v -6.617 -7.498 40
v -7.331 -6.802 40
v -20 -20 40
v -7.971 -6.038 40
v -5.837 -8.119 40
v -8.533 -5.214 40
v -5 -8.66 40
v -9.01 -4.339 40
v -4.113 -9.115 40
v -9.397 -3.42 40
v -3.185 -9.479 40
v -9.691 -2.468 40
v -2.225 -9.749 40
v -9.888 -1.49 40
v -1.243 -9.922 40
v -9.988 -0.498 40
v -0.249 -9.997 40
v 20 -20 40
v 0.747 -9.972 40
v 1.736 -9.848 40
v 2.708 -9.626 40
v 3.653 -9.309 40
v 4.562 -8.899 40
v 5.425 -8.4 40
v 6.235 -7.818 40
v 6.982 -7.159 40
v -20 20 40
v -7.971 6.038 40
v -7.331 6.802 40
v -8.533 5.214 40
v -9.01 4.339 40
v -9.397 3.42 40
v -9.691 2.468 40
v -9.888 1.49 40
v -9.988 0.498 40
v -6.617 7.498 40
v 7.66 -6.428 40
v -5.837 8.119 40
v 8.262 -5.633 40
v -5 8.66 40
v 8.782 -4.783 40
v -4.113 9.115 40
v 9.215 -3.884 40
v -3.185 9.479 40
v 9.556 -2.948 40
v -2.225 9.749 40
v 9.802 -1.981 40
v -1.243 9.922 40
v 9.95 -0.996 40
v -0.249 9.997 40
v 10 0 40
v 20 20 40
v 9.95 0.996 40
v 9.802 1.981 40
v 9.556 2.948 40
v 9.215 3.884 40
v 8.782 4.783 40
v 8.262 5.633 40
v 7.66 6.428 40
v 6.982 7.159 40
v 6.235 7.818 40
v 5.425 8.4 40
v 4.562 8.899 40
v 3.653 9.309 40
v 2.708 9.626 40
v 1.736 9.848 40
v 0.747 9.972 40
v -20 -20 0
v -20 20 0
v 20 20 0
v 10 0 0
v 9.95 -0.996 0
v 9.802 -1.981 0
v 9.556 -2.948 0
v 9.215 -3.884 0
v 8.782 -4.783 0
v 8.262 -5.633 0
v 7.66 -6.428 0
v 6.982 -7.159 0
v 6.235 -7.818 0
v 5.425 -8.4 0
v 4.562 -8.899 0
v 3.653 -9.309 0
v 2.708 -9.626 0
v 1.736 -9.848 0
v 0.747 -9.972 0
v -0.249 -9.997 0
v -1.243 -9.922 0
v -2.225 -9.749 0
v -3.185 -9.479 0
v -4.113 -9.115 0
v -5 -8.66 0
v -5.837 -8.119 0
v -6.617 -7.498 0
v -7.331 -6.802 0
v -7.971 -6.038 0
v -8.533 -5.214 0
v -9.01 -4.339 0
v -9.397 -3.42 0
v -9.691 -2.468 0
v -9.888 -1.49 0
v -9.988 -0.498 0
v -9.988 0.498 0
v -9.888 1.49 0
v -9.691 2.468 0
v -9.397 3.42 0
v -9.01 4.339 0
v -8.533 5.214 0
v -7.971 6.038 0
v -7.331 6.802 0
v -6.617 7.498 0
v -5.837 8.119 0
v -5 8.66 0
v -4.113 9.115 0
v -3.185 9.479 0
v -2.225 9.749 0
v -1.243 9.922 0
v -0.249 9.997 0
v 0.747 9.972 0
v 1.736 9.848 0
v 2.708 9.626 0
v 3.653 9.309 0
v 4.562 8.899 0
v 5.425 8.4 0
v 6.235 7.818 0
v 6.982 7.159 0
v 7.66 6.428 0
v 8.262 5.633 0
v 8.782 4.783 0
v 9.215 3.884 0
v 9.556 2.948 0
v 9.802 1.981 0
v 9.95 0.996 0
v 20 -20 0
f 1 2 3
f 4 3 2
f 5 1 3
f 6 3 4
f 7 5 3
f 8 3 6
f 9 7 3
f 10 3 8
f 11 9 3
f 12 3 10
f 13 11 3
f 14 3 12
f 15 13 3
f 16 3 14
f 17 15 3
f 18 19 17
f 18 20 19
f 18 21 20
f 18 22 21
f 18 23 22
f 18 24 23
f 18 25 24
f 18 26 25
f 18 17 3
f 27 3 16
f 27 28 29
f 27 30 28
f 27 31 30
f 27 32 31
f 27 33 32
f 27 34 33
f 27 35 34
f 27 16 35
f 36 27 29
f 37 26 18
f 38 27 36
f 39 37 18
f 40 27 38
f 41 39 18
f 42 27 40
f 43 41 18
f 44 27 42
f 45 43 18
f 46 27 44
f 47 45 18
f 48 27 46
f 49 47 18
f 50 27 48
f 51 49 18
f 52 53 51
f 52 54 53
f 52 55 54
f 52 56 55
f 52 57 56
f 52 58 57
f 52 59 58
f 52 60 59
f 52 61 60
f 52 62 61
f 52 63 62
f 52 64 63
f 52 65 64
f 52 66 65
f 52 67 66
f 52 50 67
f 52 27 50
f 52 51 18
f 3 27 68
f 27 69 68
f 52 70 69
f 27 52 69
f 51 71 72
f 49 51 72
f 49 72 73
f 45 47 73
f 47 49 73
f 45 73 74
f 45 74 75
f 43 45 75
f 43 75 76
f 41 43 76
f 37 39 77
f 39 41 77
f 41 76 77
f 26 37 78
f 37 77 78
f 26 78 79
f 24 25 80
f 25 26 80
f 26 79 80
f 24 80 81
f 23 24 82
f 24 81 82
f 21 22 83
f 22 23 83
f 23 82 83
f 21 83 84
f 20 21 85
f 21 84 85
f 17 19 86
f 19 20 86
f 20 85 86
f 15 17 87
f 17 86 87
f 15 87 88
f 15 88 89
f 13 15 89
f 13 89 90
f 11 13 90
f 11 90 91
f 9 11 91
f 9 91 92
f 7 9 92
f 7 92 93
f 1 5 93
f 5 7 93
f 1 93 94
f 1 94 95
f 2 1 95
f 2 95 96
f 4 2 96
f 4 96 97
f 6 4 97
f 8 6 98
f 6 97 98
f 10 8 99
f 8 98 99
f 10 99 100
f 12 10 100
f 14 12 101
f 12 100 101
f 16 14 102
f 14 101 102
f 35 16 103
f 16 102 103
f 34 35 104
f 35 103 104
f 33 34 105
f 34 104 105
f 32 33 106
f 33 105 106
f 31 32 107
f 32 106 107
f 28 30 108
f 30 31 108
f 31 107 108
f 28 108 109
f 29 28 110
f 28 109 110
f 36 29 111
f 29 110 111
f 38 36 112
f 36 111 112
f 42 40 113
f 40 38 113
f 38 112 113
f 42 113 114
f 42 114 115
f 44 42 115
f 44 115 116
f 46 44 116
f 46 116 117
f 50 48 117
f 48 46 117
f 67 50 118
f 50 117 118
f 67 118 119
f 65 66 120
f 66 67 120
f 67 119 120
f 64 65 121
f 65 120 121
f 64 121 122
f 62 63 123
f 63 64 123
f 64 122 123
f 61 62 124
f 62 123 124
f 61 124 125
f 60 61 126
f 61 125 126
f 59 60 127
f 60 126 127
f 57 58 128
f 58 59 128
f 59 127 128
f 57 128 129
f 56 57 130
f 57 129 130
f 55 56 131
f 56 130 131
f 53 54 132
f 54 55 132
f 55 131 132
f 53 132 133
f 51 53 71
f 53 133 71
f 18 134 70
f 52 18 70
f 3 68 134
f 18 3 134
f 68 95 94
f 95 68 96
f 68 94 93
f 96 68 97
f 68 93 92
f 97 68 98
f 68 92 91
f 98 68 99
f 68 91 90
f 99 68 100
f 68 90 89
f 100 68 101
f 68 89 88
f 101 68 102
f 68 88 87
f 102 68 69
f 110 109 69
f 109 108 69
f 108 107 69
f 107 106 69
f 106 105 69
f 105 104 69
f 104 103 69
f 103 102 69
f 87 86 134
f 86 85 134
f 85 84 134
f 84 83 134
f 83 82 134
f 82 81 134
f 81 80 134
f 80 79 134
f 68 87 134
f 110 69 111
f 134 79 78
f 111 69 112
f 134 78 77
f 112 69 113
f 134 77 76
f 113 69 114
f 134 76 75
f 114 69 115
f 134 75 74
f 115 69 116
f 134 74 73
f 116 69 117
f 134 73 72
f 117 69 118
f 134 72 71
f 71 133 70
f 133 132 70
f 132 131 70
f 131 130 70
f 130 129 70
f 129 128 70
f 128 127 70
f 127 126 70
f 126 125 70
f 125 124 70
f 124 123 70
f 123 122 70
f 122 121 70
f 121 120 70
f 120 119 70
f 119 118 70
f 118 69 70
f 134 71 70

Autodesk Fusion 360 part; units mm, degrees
sketch "WCS Profiles" plane through (0, 0, 0) normal (0, 0, 1) x (1, 0, 0)
  line L0 (20, 20) -> (-20, 20)
  line L1 (-20, 20) -> (-20, -20)
  line L2 (-20, -20) -> (20, -20)
  line L3 (20, -20) -> (20, 20)
  line L4 (20, 20) -> (-20, -20) construction
  line L5 (-20, 20) -> (20, -20) construction
  circle A0 centre (0, 0) radius 10
  dimension "d14" = 40
  dimension "d15" = 20
extrude "Extrude1" add sketch "WCS Profiles" along normal blind 40
